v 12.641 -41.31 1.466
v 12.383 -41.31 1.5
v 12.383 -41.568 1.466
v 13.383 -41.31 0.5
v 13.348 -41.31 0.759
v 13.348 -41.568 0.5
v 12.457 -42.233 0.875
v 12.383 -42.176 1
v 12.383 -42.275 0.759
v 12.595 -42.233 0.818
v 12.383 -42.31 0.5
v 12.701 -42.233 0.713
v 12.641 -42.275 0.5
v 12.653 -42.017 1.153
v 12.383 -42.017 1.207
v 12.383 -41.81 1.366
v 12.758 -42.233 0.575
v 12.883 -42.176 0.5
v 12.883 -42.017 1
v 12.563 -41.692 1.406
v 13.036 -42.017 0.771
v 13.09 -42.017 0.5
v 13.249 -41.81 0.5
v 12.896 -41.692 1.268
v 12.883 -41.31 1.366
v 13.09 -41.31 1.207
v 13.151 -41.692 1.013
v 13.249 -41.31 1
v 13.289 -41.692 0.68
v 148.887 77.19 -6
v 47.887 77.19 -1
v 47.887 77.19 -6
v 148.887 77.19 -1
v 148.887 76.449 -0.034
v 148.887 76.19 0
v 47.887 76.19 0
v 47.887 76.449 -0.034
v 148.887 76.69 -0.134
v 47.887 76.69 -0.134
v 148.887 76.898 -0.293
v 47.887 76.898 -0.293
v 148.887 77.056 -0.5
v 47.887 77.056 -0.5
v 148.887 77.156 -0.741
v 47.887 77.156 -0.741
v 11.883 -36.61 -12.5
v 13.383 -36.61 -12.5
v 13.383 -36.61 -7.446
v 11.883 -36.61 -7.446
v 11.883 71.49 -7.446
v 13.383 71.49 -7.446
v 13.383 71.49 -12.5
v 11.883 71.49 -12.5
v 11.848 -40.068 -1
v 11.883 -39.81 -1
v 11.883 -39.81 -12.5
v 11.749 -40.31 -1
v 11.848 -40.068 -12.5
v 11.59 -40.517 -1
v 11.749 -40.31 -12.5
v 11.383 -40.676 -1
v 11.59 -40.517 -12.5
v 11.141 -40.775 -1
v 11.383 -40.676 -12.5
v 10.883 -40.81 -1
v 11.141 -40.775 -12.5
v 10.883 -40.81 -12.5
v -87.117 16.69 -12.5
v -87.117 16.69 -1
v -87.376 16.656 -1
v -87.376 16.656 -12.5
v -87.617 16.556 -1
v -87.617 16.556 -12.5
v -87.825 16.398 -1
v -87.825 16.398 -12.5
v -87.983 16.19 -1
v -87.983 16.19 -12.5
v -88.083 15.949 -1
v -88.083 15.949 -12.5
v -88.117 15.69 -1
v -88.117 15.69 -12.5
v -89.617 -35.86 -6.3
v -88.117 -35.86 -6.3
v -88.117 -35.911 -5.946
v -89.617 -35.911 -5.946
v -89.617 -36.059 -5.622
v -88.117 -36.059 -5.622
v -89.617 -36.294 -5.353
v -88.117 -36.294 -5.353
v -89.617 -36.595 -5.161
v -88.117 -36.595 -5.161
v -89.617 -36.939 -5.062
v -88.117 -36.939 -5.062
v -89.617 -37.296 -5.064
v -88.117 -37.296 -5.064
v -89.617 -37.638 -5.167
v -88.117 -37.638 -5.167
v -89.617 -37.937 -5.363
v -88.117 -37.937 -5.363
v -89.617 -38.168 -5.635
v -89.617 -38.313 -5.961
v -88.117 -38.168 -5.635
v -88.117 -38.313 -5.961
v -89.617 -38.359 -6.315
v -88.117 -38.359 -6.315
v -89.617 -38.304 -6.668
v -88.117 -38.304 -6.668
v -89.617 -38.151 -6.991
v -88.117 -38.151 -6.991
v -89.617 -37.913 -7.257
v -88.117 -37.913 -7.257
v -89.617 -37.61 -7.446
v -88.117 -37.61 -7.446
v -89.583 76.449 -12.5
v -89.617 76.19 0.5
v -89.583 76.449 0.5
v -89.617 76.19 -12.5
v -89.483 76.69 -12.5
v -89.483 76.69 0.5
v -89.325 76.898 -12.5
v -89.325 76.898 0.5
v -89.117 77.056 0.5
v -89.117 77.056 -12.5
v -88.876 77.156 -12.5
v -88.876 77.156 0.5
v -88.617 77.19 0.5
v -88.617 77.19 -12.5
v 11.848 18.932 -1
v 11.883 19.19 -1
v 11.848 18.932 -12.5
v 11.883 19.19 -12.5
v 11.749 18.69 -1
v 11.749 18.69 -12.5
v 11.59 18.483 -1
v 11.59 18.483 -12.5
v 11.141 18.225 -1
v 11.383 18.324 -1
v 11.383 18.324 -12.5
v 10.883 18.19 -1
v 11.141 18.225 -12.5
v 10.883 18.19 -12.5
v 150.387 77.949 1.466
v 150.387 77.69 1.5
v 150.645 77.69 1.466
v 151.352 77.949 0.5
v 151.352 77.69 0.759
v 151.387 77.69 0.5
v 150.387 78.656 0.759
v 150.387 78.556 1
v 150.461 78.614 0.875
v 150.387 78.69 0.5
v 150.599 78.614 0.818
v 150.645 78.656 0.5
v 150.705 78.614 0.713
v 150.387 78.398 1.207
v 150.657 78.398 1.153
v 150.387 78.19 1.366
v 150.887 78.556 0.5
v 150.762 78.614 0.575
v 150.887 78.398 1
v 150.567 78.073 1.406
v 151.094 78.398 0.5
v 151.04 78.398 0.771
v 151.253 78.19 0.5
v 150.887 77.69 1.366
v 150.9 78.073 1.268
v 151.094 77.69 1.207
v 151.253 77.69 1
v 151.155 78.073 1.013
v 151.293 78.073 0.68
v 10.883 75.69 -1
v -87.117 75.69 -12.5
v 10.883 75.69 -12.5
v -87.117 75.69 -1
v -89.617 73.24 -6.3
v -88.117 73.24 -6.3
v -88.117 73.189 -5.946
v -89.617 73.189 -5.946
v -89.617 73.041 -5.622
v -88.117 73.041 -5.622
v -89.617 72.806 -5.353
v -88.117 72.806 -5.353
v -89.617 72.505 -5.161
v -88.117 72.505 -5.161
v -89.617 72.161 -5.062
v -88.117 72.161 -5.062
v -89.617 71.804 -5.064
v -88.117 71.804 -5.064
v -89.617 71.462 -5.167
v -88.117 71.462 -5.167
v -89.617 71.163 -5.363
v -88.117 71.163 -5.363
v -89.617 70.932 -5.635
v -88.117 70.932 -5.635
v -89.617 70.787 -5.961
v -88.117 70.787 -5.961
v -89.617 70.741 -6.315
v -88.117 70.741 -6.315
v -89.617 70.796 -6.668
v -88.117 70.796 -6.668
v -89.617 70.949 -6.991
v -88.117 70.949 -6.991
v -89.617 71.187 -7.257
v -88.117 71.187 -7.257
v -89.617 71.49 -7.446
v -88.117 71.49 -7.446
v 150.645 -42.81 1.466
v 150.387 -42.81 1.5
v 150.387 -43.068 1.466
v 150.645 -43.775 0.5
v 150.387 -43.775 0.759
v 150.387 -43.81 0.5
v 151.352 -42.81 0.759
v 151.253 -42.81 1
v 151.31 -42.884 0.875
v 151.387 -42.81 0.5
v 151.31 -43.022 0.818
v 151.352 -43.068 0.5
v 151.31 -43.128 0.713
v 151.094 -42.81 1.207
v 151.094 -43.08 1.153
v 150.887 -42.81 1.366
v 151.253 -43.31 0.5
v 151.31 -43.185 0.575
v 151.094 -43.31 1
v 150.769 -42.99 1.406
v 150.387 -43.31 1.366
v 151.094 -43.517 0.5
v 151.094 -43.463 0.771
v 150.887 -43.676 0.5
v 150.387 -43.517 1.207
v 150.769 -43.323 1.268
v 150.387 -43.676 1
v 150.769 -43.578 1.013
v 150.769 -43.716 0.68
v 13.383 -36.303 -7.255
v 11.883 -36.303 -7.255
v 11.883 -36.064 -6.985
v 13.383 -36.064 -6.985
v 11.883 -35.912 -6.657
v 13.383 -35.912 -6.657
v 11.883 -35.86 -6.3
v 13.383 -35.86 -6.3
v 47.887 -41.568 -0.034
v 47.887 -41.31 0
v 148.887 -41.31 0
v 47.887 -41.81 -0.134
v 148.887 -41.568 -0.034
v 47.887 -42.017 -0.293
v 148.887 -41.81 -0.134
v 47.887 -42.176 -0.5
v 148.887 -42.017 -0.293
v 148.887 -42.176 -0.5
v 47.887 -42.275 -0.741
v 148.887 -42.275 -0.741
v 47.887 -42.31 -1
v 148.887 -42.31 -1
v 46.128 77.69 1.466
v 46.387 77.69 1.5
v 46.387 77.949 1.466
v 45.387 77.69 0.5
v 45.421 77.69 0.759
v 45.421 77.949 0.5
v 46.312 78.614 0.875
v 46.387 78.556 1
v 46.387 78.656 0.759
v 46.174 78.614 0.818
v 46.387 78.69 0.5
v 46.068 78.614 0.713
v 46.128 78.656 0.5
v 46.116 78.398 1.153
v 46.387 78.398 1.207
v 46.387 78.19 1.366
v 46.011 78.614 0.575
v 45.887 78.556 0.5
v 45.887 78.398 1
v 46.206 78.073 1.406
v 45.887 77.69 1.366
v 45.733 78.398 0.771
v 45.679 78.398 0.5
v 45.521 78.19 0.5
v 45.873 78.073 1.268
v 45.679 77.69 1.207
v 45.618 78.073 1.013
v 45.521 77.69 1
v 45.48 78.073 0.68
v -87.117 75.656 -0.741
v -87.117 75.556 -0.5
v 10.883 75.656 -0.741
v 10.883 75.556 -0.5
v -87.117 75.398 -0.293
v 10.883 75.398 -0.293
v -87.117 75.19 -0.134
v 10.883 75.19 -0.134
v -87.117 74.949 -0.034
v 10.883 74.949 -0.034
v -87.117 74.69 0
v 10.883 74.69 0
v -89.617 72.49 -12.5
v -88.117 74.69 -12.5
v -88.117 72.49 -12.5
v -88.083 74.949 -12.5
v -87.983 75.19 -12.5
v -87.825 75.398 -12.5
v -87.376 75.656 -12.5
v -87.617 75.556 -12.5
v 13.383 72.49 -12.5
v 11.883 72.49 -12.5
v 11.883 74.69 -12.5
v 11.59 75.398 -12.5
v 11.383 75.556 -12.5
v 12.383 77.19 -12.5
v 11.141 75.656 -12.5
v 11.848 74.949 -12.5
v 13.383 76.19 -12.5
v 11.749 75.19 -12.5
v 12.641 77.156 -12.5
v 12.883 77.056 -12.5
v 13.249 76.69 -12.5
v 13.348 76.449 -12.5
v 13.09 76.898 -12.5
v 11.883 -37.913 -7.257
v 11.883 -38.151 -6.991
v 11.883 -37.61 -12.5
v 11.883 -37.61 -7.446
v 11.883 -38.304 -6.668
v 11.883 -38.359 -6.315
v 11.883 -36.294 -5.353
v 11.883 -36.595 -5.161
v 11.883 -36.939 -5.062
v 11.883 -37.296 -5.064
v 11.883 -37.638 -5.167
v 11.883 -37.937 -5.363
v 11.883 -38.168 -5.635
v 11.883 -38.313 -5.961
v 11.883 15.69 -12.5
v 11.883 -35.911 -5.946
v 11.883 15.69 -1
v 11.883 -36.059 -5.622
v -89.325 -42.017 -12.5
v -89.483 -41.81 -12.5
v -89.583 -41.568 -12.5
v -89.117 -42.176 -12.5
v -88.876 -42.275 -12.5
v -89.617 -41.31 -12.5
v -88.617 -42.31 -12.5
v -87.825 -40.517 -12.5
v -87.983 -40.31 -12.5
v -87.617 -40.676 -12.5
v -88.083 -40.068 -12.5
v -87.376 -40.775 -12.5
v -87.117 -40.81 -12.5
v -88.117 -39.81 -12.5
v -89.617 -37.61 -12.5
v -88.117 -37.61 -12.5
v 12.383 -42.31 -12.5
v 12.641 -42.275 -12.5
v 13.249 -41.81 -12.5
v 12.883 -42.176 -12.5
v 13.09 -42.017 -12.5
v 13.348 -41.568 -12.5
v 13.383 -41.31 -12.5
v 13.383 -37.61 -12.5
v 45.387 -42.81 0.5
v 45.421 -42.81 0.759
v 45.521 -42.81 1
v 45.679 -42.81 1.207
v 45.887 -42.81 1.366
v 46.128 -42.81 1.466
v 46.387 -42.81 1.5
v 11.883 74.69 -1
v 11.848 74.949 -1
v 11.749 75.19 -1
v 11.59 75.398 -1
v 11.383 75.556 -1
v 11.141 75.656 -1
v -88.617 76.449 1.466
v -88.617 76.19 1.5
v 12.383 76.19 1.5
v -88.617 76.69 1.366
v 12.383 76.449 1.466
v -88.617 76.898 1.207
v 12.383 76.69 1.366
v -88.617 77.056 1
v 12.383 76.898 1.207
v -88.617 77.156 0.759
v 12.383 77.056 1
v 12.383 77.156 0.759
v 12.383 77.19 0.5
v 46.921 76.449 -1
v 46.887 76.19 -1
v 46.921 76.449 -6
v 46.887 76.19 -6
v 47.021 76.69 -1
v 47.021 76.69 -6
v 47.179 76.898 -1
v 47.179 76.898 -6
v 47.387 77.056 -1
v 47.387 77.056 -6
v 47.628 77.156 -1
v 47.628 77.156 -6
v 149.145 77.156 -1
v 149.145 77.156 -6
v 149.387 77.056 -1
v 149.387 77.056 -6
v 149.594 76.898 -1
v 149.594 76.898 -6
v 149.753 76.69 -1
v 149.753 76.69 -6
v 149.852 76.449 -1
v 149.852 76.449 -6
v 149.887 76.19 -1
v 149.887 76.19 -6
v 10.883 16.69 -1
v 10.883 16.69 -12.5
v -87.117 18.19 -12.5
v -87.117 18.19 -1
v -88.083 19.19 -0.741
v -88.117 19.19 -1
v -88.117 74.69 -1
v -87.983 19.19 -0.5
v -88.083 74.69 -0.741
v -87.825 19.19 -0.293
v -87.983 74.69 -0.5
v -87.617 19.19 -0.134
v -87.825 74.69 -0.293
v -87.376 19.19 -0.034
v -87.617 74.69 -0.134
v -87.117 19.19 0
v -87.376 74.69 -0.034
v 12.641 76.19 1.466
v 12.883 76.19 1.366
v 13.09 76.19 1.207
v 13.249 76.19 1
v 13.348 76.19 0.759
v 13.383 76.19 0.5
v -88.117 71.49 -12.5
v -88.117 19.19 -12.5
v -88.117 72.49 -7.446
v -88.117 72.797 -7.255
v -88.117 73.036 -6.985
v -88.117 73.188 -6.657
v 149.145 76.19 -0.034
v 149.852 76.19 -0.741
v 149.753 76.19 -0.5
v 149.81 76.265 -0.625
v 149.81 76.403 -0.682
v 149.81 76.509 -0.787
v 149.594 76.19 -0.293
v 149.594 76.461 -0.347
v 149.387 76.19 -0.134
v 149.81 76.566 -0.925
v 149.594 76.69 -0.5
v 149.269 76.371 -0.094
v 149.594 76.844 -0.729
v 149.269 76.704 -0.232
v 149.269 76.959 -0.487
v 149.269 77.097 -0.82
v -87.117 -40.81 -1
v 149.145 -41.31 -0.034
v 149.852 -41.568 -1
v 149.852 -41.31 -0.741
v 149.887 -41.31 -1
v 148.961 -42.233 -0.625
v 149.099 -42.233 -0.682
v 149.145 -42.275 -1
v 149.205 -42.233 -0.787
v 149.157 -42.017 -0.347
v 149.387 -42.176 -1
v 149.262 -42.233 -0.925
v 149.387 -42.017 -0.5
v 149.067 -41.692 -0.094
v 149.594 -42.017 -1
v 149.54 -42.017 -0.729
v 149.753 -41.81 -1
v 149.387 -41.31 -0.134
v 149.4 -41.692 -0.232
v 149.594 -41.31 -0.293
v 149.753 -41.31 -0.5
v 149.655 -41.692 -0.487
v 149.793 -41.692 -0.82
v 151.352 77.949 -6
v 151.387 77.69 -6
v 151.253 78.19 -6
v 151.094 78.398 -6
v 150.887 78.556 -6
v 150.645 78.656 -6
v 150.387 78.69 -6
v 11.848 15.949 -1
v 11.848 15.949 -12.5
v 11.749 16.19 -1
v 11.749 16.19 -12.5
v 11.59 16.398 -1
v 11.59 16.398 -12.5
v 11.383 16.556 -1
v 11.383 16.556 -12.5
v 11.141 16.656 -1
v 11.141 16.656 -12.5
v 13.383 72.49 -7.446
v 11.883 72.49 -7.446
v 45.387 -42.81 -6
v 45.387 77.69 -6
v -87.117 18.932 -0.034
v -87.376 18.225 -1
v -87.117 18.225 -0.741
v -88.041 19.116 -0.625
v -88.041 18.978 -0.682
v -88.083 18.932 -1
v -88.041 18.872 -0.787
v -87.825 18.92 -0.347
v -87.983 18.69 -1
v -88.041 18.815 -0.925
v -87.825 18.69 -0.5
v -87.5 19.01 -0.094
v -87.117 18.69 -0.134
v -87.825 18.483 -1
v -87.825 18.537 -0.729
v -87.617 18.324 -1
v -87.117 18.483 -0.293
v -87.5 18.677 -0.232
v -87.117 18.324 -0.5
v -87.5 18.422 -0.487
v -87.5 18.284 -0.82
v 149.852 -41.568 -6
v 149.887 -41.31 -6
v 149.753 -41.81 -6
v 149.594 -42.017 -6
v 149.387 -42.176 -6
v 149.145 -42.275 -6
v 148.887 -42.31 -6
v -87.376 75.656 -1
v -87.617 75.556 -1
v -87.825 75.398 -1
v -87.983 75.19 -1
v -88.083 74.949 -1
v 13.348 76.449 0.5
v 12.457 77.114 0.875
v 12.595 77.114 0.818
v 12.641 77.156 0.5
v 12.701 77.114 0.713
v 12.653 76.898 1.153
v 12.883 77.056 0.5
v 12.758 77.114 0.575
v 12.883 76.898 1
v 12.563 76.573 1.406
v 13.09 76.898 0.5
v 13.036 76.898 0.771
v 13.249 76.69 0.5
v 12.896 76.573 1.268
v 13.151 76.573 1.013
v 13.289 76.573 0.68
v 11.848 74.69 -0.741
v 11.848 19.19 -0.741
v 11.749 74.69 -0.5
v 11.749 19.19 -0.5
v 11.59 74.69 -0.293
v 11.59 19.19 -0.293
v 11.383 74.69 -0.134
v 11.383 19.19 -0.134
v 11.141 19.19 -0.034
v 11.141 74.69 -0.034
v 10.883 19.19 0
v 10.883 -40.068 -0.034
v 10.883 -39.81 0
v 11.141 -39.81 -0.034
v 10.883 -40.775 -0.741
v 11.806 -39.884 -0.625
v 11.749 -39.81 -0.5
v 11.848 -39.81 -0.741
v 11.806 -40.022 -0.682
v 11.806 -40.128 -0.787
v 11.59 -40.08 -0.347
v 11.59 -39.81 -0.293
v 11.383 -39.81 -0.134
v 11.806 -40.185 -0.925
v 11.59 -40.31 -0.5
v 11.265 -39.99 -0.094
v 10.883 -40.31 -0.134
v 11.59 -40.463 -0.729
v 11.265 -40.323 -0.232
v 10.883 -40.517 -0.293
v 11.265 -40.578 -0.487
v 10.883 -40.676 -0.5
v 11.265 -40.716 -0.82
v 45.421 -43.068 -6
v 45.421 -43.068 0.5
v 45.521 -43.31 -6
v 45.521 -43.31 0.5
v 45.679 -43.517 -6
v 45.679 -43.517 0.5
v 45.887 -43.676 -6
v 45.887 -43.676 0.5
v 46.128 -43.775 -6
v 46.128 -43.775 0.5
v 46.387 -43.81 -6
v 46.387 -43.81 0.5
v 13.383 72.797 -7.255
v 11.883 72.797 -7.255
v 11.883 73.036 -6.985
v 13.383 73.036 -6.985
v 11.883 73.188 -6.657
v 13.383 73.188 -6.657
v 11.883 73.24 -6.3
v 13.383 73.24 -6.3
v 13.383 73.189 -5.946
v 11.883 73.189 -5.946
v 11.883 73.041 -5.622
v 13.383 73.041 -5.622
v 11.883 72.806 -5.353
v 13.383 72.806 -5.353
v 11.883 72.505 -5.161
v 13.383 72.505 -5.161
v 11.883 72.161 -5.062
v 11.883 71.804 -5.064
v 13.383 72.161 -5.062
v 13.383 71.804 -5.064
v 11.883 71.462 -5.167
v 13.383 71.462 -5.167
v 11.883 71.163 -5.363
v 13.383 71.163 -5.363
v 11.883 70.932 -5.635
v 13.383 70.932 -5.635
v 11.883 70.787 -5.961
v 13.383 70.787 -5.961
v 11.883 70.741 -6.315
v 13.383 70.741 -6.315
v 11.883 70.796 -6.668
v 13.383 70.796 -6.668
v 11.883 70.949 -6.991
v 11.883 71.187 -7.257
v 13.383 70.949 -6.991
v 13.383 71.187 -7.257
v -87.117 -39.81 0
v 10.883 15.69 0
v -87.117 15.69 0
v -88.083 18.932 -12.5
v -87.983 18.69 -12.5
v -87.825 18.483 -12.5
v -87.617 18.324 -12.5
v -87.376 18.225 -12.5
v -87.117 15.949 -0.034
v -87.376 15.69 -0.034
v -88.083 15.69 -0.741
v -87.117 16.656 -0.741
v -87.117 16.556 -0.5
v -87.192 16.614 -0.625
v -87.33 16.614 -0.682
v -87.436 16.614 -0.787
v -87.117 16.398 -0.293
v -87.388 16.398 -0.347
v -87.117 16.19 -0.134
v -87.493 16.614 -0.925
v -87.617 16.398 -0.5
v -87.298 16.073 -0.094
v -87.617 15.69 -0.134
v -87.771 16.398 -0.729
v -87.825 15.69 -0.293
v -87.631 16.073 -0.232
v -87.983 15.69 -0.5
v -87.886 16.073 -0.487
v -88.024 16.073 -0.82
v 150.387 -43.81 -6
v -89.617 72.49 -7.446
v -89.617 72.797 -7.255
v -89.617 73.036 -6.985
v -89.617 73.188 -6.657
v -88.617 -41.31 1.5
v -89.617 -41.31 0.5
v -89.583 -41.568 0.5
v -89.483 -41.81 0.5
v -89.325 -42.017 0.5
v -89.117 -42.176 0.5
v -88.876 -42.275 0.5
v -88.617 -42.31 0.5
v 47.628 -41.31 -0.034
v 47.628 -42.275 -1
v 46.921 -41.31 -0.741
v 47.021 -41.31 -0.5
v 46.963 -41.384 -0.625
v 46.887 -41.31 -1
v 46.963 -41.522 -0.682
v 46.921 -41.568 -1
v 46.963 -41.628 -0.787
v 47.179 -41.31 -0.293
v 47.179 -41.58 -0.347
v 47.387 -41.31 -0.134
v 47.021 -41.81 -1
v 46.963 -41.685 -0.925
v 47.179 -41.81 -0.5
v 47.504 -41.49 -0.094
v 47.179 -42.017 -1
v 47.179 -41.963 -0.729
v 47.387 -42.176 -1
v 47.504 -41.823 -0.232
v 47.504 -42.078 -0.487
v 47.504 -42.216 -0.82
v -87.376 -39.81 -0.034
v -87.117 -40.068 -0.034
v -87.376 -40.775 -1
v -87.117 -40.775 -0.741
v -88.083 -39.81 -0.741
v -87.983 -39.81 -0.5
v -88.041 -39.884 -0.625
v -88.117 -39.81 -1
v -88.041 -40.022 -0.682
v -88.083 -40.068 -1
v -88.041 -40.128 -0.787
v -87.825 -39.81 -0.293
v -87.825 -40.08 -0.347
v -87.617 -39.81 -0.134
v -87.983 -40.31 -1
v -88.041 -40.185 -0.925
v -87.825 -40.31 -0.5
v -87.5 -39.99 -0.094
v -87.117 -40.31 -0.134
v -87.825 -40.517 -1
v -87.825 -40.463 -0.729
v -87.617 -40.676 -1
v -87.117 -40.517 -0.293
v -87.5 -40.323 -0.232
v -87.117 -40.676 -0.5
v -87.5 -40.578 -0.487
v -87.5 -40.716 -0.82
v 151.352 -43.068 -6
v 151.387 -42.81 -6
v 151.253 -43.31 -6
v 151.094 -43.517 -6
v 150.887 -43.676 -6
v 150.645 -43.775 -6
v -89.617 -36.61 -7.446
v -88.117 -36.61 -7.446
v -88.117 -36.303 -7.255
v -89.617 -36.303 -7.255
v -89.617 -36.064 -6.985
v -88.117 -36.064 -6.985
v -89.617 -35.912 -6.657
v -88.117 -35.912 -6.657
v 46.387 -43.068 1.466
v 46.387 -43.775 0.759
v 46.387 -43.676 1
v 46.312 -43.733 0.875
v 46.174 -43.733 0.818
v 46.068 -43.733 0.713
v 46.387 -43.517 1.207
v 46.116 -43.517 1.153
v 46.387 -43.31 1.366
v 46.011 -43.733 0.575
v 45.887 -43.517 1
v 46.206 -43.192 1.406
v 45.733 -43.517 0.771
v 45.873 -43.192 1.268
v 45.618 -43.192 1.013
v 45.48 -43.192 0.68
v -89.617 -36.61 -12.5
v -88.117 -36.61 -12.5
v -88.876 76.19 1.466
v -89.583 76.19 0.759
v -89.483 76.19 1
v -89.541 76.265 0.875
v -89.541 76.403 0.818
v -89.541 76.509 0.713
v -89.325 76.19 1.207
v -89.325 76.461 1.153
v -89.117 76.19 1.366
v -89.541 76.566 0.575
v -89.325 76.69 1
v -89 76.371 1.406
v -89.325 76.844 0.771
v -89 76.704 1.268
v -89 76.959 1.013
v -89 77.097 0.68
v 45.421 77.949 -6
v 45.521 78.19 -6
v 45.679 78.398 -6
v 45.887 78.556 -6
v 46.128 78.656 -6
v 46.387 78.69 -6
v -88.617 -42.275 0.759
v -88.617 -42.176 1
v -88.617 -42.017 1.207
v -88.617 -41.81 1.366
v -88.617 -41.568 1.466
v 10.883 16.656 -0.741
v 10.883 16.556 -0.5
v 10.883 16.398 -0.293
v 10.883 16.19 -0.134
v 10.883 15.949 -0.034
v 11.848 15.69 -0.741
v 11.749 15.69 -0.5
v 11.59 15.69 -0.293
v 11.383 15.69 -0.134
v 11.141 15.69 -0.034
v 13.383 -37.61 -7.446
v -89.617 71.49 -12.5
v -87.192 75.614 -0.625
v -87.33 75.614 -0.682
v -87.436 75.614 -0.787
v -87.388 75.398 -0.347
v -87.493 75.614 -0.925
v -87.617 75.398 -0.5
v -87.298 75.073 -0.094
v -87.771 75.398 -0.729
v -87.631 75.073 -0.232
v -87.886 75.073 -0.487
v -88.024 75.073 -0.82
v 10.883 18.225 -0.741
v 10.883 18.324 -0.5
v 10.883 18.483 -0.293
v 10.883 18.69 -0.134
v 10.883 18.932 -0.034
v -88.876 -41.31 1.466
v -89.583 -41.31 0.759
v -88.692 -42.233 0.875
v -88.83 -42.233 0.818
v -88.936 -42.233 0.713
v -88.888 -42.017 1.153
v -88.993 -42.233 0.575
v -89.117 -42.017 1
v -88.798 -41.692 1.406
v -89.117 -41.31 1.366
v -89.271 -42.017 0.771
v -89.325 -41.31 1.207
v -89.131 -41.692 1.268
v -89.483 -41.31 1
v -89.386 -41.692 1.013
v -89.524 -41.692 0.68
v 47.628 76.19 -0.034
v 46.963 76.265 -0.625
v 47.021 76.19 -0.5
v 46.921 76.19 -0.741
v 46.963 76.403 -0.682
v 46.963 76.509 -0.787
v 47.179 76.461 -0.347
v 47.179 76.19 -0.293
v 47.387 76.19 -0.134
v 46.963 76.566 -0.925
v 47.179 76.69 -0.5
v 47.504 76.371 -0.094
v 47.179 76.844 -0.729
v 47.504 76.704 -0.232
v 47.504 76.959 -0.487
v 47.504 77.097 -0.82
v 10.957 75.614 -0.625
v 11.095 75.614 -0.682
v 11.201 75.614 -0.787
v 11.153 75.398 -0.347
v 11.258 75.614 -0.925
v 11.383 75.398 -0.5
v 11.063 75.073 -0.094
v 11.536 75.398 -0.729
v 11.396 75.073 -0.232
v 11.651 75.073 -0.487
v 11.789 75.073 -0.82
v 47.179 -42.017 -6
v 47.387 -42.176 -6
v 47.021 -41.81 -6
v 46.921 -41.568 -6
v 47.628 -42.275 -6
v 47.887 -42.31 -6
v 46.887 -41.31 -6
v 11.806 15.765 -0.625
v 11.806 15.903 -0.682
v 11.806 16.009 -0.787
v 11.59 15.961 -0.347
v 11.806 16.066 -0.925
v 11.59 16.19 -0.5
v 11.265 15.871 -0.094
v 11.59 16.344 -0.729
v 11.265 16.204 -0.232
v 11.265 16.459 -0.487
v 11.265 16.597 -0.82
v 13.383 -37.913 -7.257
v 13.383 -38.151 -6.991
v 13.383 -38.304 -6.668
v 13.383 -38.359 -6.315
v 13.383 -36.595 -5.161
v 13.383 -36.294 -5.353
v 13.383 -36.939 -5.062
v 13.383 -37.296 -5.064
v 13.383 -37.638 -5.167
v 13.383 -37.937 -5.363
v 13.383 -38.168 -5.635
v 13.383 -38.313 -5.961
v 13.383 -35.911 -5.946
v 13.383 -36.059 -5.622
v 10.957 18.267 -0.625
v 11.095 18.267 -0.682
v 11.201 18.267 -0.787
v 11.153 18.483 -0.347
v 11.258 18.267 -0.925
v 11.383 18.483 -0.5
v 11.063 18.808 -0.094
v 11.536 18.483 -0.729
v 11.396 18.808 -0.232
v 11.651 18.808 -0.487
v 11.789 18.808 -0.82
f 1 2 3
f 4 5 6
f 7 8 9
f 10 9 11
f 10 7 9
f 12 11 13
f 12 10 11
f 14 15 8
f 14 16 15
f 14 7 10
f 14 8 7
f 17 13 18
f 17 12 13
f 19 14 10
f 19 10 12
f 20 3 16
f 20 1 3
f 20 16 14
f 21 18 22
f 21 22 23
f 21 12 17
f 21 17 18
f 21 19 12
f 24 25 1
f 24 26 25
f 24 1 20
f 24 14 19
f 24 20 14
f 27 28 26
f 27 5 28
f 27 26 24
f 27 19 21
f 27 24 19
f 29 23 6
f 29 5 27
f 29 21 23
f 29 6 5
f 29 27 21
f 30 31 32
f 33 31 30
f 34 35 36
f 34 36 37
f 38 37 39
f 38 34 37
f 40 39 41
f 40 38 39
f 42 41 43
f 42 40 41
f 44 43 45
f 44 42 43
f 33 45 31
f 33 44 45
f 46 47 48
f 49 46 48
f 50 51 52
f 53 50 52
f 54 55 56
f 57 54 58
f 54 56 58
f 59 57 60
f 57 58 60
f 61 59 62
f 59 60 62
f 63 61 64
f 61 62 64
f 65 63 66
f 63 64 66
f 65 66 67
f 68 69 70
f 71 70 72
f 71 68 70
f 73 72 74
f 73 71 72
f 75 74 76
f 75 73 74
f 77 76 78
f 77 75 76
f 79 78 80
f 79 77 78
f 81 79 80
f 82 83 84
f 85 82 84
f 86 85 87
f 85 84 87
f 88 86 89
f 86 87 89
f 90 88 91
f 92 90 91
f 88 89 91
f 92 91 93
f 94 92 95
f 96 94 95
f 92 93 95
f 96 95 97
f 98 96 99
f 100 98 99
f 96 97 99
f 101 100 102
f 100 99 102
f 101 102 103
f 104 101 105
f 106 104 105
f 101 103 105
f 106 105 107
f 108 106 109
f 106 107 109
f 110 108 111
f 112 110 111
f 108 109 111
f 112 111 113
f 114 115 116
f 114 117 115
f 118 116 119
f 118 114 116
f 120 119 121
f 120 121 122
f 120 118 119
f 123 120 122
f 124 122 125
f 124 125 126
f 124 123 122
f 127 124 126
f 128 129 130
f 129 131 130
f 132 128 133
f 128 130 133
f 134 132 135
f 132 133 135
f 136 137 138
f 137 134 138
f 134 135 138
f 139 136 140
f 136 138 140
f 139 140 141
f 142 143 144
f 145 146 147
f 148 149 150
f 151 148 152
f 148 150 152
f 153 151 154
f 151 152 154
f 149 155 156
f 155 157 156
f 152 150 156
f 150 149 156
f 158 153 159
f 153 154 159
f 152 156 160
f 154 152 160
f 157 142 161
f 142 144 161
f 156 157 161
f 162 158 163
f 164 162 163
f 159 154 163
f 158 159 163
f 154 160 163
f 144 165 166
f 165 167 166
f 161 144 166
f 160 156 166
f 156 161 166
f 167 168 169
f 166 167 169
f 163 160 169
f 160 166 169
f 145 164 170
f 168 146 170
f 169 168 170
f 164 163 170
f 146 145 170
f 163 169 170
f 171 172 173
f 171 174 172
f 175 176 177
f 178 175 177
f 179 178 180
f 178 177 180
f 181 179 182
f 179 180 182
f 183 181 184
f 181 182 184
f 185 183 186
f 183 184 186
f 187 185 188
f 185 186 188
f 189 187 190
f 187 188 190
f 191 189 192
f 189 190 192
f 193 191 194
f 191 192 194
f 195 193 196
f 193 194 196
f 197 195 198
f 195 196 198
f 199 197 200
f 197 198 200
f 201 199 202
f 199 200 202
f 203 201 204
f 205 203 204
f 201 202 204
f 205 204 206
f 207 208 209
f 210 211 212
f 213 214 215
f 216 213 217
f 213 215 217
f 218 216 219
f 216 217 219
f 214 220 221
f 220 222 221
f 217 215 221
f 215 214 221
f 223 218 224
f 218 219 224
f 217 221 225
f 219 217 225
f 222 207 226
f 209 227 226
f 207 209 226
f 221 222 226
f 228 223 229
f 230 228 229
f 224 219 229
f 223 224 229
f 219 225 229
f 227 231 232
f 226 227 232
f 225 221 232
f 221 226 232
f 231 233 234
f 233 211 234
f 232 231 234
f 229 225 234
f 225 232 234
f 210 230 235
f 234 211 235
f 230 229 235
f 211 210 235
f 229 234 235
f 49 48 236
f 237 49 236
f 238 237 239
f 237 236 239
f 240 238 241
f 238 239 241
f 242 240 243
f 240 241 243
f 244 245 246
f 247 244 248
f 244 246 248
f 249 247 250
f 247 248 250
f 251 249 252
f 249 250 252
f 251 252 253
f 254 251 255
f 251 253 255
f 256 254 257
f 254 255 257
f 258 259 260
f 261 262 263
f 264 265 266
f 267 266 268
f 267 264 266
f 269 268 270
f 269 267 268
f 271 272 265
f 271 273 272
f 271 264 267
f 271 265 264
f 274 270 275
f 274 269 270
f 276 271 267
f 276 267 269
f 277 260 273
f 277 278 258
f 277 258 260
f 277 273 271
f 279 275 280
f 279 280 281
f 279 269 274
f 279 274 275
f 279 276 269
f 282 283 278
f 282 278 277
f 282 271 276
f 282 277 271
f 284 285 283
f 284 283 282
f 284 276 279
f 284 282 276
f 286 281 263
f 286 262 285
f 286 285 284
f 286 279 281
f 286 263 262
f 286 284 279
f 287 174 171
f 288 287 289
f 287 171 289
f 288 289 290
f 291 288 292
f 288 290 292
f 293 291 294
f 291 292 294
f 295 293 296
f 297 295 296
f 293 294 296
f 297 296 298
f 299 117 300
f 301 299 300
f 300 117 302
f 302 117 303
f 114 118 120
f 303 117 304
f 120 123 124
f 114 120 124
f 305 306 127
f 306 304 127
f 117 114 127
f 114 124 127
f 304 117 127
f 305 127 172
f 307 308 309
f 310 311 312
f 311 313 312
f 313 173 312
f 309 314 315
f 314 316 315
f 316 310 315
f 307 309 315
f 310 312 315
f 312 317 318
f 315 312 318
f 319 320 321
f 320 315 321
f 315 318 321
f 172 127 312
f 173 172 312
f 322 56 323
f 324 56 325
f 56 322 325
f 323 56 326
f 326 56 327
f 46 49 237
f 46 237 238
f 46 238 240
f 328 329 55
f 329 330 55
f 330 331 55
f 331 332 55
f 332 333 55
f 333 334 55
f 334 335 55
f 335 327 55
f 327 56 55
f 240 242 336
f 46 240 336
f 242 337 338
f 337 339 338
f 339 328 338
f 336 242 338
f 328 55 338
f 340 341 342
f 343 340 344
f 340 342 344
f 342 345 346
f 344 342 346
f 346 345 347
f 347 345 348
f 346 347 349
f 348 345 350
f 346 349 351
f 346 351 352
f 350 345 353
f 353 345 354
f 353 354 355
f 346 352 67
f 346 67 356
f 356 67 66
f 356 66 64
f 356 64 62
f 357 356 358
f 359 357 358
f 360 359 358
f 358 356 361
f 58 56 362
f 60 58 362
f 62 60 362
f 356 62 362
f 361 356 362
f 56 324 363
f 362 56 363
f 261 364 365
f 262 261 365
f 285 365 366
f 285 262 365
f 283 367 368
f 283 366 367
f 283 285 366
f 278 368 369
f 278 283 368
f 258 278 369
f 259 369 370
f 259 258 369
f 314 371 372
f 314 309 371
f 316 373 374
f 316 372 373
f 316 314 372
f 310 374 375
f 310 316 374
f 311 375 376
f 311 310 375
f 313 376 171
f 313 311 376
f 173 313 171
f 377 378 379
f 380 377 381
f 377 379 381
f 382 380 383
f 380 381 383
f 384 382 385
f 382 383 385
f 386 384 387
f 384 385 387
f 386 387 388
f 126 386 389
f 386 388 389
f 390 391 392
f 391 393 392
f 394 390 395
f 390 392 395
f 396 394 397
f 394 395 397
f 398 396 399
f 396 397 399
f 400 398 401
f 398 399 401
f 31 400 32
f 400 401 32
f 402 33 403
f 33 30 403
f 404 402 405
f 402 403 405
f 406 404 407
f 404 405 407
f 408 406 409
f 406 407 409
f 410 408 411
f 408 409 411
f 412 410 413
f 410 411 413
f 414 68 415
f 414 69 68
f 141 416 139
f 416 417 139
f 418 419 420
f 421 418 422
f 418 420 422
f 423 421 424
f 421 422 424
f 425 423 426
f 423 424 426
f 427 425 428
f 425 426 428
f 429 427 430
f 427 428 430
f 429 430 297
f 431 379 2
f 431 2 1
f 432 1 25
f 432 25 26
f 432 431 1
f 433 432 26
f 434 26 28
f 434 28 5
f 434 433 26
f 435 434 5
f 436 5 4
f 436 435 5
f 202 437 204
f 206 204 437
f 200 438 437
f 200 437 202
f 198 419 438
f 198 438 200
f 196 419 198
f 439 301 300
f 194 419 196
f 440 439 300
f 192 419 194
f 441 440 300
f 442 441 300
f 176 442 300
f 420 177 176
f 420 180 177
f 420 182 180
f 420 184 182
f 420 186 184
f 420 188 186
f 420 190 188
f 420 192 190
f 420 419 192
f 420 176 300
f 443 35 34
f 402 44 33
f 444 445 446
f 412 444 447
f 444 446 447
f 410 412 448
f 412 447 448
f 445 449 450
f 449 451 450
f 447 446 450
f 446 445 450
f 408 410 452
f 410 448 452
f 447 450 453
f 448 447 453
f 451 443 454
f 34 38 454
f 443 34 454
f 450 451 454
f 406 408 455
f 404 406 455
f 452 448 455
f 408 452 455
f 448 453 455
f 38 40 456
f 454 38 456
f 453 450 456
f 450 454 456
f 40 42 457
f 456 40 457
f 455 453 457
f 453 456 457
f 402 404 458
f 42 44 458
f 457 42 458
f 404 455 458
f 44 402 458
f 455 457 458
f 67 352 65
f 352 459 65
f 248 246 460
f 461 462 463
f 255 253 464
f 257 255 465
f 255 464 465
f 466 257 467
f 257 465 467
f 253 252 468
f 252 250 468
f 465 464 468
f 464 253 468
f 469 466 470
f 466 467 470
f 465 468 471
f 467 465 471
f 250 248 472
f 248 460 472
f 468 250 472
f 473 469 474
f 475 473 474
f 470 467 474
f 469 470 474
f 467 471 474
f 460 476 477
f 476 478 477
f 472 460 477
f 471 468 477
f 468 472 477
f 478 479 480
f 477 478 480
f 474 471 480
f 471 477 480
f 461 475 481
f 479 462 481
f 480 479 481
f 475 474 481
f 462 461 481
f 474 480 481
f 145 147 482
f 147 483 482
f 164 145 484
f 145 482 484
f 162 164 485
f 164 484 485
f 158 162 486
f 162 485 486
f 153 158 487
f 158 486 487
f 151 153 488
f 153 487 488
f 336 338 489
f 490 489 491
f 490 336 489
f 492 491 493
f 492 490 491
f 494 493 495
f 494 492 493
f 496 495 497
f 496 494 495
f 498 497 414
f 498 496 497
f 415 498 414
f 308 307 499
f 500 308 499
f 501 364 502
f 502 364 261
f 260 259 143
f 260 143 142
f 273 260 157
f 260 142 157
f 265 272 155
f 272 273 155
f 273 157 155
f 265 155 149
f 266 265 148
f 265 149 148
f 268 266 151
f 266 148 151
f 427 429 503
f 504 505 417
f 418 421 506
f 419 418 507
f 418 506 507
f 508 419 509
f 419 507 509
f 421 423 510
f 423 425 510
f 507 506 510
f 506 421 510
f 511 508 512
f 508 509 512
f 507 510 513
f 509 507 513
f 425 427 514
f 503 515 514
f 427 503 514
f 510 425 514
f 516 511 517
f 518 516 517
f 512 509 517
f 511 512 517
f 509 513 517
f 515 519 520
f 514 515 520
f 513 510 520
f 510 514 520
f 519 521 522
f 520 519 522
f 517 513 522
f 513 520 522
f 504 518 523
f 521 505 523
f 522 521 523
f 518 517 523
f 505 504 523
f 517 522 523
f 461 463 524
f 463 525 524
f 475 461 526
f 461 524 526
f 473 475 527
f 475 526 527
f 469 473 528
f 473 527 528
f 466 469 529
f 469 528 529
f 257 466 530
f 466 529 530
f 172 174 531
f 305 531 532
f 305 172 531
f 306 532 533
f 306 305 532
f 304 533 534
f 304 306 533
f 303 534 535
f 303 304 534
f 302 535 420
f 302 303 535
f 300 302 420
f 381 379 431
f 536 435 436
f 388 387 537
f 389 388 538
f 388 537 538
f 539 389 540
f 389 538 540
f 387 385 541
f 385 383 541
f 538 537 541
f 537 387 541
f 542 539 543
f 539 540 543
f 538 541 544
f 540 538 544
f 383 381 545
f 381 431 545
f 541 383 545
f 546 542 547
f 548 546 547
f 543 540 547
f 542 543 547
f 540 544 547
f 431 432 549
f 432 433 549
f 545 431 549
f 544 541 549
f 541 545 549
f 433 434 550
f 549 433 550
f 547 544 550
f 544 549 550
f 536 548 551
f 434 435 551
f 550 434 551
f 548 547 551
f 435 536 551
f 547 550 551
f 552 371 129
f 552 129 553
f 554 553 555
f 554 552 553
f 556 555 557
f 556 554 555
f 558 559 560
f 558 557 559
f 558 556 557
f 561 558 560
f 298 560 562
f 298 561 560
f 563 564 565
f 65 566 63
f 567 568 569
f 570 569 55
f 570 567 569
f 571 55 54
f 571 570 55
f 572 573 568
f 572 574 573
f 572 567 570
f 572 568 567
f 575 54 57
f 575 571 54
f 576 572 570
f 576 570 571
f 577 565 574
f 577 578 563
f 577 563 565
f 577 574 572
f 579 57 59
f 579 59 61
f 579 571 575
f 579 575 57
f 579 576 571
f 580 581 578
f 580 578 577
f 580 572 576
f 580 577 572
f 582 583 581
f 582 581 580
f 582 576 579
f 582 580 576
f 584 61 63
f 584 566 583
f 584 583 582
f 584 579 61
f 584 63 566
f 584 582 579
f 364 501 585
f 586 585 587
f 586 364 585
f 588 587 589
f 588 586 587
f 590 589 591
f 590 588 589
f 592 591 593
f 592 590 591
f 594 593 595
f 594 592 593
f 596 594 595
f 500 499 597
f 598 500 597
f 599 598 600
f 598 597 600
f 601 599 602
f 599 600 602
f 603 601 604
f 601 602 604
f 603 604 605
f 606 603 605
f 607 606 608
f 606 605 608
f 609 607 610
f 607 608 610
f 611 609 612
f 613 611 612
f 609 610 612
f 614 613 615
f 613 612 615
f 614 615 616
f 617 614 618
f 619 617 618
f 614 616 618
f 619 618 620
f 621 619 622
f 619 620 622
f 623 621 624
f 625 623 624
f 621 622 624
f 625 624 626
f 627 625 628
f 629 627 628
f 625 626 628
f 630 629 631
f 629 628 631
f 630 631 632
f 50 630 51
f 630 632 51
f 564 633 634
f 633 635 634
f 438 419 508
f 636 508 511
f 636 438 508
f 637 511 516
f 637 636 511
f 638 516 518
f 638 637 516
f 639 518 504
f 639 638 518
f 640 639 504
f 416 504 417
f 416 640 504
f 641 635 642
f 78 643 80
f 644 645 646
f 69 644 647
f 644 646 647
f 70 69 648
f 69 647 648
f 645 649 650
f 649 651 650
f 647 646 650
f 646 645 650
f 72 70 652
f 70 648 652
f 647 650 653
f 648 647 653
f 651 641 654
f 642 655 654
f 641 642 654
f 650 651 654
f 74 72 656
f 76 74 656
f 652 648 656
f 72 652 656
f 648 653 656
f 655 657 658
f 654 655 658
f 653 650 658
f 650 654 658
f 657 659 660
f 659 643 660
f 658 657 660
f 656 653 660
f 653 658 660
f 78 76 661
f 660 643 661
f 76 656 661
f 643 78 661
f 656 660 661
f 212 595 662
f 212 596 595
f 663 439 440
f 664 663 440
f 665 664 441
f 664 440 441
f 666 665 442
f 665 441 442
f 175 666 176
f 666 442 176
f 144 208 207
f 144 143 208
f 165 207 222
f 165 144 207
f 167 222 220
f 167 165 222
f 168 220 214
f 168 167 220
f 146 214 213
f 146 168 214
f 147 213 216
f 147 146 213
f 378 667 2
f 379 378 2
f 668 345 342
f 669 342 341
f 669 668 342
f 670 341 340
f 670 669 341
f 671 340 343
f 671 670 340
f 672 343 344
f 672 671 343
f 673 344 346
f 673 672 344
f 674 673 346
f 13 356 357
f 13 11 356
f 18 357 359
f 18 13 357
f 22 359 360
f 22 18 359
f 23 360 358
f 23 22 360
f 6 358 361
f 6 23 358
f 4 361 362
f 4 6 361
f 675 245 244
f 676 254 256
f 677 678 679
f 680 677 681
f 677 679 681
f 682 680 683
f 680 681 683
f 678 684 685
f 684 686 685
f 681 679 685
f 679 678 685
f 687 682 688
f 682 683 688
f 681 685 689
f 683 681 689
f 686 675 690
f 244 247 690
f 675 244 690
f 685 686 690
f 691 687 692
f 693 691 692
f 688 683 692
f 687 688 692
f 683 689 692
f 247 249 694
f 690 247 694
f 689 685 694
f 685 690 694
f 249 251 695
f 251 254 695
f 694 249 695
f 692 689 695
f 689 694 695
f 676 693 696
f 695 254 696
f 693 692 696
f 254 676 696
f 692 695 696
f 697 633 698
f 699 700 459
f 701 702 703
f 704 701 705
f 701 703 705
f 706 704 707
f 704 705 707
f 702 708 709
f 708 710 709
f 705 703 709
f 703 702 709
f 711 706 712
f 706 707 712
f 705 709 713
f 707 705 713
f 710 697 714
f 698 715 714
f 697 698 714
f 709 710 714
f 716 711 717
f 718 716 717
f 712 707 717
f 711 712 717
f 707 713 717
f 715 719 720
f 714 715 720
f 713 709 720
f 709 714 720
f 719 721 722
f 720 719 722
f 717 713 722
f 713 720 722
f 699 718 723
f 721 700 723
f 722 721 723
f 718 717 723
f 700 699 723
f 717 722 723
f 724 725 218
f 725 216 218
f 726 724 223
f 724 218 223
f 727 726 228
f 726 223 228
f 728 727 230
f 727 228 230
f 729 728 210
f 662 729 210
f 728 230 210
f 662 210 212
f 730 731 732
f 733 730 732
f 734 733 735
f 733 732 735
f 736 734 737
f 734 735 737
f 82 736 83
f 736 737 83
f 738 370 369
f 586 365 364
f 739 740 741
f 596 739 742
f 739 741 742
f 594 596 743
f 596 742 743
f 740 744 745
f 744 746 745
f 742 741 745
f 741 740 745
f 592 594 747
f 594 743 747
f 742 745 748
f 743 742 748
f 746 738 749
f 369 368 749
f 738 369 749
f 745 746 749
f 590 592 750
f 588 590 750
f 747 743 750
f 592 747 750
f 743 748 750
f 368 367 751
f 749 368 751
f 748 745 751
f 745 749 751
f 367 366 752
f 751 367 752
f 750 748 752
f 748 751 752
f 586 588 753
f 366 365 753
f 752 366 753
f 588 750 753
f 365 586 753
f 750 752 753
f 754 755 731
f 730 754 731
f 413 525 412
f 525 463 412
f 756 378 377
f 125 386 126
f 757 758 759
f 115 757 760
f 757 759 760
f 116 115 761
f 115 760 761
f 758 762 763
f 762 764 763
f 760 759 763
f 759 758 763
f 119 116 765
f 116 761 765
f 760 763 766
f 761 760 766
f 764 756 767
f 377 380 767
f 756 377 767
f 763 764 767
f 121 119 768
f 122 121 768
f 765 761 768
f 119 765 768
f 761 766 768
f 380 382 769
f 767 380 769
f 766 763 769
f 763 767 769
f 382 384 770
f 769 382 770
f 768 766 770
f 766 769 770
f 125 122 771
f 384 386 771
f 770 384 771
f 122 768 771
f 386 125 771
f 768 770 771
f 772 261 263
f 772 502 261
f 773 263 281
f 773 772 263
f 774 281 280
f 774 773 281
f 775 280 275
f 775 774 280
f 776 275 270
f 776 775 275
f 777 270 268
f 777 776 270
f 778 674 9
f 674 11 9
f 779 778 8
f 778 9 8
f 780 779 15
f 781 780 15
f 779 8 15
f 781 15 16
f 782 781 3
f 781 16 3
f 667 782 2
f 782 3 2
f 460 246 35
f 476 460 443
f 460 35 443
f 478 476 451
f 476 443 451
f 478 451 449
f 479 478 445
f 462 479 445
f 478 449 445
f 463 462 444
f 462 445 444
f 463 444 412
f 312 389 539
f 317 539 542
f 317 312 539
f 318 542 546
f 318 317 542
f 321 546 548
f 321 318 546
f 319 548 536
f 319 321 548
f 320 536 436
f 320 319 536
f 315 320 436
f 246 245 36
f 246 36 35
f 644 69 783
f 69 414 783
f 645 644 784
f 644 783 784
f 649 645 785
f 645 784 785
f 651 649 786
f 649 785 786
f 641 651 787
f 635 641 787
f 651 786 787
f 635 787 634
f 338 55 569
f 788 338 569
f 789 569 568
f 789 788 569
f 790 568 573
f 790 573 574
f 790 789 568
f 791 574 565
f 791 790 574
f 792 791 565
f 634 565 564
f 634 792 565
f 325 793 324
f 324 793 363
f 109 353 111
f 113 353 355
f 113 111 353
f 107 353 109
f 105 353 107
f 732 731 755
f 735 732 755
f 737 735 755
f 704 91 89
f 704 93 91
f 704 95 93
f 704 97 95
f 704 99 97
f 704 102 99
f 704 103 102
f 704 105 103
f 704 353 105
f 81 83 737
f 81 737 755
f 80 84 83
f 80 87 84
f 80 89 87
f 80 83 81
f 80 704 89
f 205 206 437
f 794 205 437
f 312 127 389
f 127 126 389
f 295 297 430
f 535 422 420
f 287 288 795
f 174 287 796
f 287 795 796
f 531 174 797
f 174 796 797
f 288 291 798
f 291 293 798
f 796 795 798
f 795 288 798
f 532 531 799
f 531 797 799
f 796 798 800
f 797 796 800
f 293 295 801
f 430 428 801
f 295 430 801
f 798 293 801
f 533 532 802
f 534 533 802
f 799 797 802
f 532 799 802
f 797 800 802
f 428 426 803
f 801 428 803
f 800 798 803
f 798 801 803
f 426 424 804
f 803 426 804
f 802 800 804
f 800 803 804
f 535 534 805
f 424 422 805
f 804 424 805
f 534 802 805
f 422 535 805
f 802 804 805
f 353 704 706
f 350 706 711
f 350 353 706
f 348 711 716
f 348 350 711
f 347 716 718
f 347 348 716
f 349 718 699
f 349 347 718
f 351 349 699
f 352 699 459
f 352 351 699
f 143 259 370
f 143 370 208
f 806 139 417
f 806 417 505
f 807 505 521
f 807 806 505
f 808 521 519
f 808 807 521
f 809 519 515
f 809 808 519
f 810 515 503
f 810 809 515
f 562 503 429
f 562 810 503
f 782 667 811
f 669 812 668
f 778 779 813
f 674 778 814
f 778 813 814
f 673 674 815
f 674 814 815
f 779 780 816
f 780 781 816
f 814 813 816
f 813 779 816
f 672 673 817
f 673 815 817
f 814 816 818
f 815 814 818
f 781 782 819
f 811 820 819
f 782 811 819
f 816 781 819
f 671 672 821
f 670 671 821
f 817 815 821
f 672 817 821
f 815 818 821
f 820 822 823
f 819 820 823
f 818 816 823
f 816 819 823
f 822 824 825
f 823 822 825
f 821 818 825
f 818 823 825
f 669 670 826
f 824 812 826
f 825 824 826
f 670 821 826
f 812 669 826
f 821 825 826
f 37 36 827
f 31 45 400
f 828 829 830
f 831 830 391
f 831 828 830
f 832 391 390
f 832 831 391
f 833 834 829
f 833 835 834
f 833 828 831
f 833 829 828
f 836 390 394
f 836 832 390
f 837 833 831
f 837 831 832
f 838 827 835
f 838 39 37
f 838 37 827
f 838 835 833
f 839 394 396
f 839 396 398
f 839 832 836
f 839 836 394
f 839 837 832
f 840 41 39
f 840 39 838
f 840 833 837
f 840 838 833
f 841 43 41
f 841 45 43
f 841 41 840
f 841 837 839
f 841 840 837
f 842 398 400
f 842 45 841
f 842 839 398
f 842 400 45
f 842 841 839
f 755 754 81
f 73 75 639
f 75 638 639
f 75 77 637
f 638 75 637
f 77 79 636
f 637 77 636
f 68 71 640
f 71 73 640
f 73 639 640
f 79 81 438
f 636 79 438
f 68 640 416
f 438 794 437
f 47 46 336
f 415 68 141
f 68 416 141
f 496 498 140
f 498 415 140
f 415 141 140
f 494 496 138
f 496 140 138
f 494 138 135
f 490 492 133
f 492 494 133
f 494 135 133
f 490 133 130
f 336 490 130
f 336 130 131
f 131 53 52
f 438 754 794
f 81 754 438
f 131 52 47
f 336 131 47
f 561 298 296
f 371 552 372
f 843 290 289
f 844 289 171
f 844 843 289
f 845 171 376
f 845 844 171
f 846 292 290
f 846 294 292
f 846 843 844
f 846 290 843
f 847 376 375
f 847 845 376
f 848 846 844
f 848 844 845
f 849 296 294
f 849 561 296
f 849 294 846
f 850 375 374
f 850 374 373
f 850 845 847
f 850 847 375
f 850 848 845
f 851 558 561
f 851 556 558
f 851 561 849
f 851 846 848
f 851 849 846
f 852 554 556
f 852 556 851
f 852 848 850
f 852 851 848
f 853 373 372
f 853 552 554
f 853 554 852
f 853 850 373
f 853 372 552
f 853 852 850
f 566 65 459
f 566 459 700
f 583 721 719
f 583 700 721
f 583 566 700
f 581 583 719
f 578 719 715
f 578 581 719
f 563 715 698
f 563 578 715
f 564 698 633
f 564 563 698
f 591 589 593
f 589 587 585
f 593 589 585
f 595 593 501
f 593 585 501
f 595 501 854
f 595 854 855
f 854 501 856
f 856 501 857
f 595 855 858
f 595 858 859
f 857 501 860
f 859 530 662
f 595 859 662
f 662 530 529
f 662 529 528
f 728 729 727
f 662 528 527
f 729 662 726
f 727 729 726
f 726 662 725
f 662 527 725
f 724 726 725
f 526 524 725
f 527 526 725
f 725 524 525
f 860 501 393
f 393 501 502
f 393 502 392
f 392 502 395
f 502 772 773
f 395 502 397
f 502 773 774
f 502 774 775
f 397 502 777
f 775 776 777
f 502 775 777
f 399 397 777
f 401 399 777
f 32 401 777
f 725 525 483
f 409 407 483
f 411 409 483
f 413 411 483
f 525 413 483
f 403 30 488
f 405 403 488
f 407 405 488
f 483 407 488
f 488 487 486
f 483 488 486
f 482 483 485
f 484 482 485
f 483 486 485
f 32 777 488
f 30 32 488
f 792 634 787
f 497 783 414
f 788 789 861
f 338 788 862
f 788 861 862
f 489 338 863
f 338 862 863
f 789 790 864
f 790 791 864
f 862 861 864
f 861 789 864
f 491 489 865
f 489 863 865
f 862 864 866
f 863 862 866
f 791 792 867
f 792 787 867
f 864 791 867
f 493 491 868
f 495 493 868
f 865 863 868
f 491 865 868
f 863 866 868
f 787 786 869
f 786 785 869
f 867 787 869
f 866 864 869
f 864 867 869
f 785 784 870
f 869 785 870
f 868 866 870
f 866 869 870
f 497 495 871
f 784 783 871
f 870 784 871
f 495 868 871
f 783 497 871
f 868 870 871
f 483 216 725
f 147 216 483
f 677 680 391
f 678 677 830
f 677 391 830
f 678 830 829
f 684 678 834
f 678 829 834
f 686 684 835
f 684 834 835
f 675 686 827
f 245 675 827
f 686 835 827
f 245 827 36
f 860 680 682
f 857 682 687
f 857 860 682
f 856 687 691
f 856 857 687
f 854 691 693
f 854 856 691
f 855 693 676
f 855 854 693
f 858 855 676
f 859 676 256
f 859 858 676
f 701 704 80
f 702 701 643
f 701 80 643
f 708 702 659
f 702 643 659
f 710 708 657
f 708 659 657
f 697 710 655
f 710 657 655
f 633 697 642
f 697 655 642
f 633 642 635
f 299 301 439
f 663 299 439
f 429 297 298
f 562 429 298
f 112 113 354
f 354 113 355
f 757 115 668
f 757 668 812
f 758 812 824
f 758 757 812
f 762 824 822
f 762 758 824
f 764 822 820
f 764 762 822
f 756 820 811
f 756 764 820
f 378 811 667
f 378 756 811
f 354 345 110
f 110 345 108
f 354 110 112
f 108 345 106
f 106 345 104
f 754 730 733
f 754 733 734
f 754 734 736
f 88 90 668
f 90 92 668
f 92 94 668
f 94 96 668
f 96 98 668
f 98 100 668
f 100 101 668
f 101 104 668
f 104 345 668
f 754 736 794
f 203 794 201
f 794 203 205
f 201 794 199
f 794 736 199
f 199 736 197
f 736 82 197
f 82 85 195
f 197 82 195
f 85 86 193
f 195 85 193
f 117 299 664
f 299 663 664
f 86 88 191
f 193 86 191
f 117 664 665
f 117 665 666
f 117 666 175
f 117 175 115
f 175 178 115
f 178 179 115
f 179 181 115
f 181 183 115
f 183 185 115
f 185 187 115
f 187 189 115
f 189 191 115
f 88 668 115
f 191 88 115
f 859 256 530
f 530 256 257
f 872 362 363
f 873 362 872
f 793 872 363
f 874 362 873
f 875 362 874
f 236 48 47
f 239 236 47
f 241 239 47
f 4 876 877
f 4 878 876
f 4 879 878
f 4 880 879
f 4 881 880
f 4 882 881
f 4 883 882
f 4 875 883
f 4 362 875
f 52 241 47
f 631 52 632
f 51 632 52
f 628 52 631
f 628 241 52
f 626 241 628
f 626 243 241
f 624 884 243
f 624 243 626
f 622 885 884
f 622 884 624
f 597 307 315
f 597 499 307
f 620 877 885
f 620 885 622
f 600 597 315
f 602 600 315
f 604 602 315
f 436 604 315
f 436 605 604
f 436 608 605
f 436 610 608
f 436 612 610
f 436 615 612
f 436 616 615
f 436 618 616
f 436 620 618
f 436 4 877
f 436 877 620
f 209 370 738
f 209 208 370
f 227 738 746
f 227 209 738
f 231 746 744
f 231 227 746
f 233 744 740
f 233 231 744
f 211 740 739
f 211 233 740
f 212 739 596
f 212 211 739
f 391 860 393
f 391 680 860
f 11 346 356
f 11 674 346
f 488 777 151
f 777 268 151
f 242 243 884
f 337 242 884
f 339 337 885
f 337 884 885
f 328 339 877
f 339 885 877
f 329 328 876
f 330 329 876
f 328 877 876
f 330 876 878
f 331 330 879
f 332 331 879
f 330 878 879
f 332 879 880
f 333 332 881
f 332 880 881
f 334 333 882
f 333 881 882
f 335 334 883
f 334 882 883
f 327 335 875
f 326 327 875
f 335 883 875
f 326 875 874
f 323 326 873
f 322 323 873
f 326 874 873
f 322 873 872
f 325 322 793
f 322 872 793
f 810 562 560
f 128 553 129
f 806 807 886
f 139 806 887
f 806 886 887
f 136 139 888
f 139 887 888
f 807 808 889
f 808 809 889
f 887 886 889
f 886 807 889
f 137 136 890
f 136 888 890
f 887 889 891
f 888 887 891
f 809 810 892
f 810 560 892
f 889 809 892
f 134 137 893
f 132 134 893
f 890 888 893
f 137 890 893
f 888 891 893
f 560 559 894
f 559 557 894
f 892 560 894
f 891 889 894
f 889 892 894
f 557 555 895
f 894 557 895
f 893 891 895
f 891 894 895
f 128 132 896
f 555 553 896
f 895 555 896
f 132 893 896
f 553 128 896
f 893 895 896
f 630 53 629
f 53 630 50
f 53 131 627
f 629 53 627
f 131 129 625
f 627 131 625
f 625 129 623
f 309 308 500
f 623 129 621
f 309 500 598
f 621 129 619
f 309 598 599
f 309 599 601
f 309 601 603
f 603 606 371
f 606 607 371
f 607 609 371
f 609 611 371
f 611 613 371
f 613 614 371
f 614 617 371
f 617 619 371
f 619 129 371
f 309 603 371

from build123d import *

# Parameters (mm, degrees)
F0_W     = 103
F0_H     = 119.5
F0_W_2   = 100
F0_H_2   = 57.5
F1_DEPTH = 1.5
F0_W_3   = 106
F0_H_3   = 122.5
F2_DEPTH = 12.5
F4_DEPTH = 6
F5_DEPTH = 103.001
F6_R     = 1
F6_2_R   = 1


with BuildPart() as f1:
    # F0 (on Top) → F1 (new body)
    with BuildSketch(Plane.XY):
        with Locations((-38.117450853, 17.4404647723)):
            Rectangle(F0_W, F0_H)
        with Locations((-38.117450853, -12.0595352277)):
            Rectangle(F0_W_2, F0_H_2, mode=Mode.SUBTRACT)
        with Locations((-38.117450853, 46.9404647723)):
            Rectangle(F0_W_2, F0_H_2, mode=Mode.SUBTRACT)
        with Locations((-38.117450853, 46.9404647723)):
            Rectangle(F0_W_2, F0_H_2)
        with Locations((-38.117450853, -12.0595352277)):
            Rectangle(F0_W_2, F0_H_2)
    extrude(amount=F1_DEPTH)

    # F0 (on Top) → F2 (join)
    with BuildSketch(Plane.XY):
        with Locations((-38.117450853, 17.4404647723)):
            Rectangle(F0_W, F0_H)
        with Locations((-38.117450853, -12.0595352277)):
            Rectangle(F0_W_2, F0_H_2, mode=Mode.SUBTRACT)
        with Locations((-38.117450853, 46.9404647723)):
            Rectangle(F0_W_2, F0_H_2, mode=Mode.SUBTRACT)
    extrude(amount=-F2_DEPTH)

    # F3 (on face) → F5 (cut, through all)
    with BuildSketch(Plane.YZ.offset(13.382549147)):
        with BuildLine():
            ThreePointArc((-36.6095352277, -7.4456439237), (-36.0637101945, -6.9846531969), (-35.8595352277, -6.3))
            ThreePointArc((-35.8595352277, -6.3), (-37.7941884246, -5.2541749668), (-37.6095352277, -7.4456439237))
            Line((-37.6095352277, -7.4456439237), (-37.6095352277, -6.3))
            Line((-37.6095352277, -6.3), (-36.6095352277, -6.3))
            Line((-36.6095352277, -6.3), (-36.6095352277, -7.4456439237))
        make_face()
        with BuildLine():
            Line((-37.6095352277, -6.3), (-37.6095352277, -7.4456439237))
            ThreePointArc((-37.6095352277, -7.4456439237), (-37.1095352277, -7.55), (-36.6095352277, -7.4456439237))
            Line((-36.6095352277, -7.4456439237), (-36.6095352277, -6.3))
            Line((-36.6095352277, -6.3), (-37.6095352277, -6.3))
        make_face()
        with BuildLine():
            ThreePointArc((-36.6095352277, -7.4456439237), (-37.1095352277, -7.55), (-37.6095352277, -7.4456439237))
            Line((-37.6095352277, -7.4456439237), (-37.6095352277, -12.5))
            Line((-37.6095352277, -12.5), (-36.6095352277, -12.5))
            Line((-36.6095352277, -12.5), (-36.6095352277, -7.4456439237))
        make_face()
        with BuildLine():
            Line((71.4904647723, -6.3), (71.4904647723, -7.4456439237))
            ThreePointArc((71.4904647723, -7.4456439237), (71.9904647723, -7.55), (72.4904647723, -7.4456439237))
            Line((72.4904647723, -7.4456439237), (72.4904647723, -6.3))
            Line((72.4904647723, -6.3), (71.4904647723, -6.3))
        make_face()
        with BuildLine():
            ThreePointArc((73.2404647723, -6.3), (71.3058115754, -5.2541749668), (71.4904647723, -7.4456439237))
            Line((71.4904647723, -7.4456439237), (71.4904647723, -6.3))
            Line((71.4904647723, -6.3), (72.4904647723, -6.3))
            Line((72.4904647723, -6.3), (72.4904647723, -7.4456439237))
            ThreePointArc((72.4904647723, -7.4456439237), (73.0362898055, -6.9846531969), (73.2404647723, -6.3))
        make_face()
        with BuildLine():
            Line((71.4904647723, -7.4456439237), (71.4904647723, -12.5))
            Line((71.4904647723, -12.5), (72.4904647723, -12.5))
            Line((72.4904647723, -12.5), (72.4904647723, -7.4456439237))
            ThreePointArc((72.4904647723, -7.4456439237), (71.9904647723, -7.55), (71.4904647723, -7.4456439237))
        make_face()
    extrude(amount=-F5_DEPTH, mode=Mode.SUBTRACT)

    # F6
    f6_edges = [f1.edges().sort_by_distance(p)[0] for p in [
        (13.382549, 17.440465, 1.5),
        (-38.117451, 77.190465, 1.5),
        (-89.617451, 17.440465, 1.5),
        (-38.117451, -42.309535, 1.5),
        (13.382549, 77.190465, -5.5),
        (-89.617451, 77.190465, -5.5),
        (13.382549, -42.309535, -5.5),
        (-89.617451, -42.309535, -5.5),
        (-38.117451, -40.809535, 0),
        (-88.117451, -12.059535, 0),
        (-38.117451, 16.690465, 0),
        (11.882549, -12.059535, 0),
        (11.882549, 46.940465, 0),
        (-38.117451, 18.190465, 0),
        (-88.117451, 46.940465, 0),
        (-38.117451, 75.690465, 0),
        (11.882549, 16.690465, -6.25),
        (11.882549, 18.190465, -6.25),
        (-88.117451, -40.809535, -6.25),
        (-88.117451, 18.190465, -6.25),
        (-88.117451, 16.690465, -6.25),
        (-88.117451, 75.690465, -6.25),
        (11.882549, 75.690465, -6.25),
        (11.882549, -40.809535, -6.25),
    ]]
    fillet(f6_edges, radius=F6_R)


with BuildPart() as f1b:
    # F0 (on Top) → F1, piece 2 (new body)
    with BuildSketch(Plane.XY):
        with Locations((98.3865490854, 17.4404647723)):
            Rectangle(F0_W_3, F0_H_3)
        with Locations((98.3865490854, 17.4404647723)):
            Rectangle(F0_W, F0_H, mode=Mode.SUBTRACT)
        with Locations((98.3865490854, 17.4404647723)):
            Rectangle(F0_W, F0_H)
    extrude(amount=F1_DEPTH)

    # F0 (on Top) → F4 (join)
    with BuildSketch(Plane.XY):
        with Locations((98.3865490854, 17.4404647723)):
            Rectangle(F0_W_3, F0_H_3)
        with Locations((98.3865490854, 17.4404647723)):
            Rectangle(F0_W, F0_H, mode=Mode.SUBTRACT)
    extrude(amount=-F4_DEPTH)

    # F6#2
    f6_2_edges = [f1b.edges().sort_by_distance(p)[0] for p in [
        (98.386549, 77.190465, 0),
        (149.886549, 17.440465, 0),
        (98.386549, -42.309535, 0),
        (46.886549, 17.440465, 0),
        (45.386549, 17.440465, 1.5),
        (98.386549, -43.809535, 1.5),
        (151.386549, 17.440465, 1.5),
        (98.386549, 78.690465, 1.5),
        (151.386549, 78.690465, -2.25),
        (45.386549, 78.690465, -2.25),
        (151.386549, -43.809535, -2.25),
        (45.386549, -43.809535, -2.25),
        (46.886549, -42.309535, -3),
        (46.886549, 77.190465, -3),
        (149.886549, 77.190465, -3),
        (149.886549, -42.309535, -3),
    ]]
    fillet(f6_2_edges, radius=F6_2_R)


solid = Compound([f1.part, f1b.part])
